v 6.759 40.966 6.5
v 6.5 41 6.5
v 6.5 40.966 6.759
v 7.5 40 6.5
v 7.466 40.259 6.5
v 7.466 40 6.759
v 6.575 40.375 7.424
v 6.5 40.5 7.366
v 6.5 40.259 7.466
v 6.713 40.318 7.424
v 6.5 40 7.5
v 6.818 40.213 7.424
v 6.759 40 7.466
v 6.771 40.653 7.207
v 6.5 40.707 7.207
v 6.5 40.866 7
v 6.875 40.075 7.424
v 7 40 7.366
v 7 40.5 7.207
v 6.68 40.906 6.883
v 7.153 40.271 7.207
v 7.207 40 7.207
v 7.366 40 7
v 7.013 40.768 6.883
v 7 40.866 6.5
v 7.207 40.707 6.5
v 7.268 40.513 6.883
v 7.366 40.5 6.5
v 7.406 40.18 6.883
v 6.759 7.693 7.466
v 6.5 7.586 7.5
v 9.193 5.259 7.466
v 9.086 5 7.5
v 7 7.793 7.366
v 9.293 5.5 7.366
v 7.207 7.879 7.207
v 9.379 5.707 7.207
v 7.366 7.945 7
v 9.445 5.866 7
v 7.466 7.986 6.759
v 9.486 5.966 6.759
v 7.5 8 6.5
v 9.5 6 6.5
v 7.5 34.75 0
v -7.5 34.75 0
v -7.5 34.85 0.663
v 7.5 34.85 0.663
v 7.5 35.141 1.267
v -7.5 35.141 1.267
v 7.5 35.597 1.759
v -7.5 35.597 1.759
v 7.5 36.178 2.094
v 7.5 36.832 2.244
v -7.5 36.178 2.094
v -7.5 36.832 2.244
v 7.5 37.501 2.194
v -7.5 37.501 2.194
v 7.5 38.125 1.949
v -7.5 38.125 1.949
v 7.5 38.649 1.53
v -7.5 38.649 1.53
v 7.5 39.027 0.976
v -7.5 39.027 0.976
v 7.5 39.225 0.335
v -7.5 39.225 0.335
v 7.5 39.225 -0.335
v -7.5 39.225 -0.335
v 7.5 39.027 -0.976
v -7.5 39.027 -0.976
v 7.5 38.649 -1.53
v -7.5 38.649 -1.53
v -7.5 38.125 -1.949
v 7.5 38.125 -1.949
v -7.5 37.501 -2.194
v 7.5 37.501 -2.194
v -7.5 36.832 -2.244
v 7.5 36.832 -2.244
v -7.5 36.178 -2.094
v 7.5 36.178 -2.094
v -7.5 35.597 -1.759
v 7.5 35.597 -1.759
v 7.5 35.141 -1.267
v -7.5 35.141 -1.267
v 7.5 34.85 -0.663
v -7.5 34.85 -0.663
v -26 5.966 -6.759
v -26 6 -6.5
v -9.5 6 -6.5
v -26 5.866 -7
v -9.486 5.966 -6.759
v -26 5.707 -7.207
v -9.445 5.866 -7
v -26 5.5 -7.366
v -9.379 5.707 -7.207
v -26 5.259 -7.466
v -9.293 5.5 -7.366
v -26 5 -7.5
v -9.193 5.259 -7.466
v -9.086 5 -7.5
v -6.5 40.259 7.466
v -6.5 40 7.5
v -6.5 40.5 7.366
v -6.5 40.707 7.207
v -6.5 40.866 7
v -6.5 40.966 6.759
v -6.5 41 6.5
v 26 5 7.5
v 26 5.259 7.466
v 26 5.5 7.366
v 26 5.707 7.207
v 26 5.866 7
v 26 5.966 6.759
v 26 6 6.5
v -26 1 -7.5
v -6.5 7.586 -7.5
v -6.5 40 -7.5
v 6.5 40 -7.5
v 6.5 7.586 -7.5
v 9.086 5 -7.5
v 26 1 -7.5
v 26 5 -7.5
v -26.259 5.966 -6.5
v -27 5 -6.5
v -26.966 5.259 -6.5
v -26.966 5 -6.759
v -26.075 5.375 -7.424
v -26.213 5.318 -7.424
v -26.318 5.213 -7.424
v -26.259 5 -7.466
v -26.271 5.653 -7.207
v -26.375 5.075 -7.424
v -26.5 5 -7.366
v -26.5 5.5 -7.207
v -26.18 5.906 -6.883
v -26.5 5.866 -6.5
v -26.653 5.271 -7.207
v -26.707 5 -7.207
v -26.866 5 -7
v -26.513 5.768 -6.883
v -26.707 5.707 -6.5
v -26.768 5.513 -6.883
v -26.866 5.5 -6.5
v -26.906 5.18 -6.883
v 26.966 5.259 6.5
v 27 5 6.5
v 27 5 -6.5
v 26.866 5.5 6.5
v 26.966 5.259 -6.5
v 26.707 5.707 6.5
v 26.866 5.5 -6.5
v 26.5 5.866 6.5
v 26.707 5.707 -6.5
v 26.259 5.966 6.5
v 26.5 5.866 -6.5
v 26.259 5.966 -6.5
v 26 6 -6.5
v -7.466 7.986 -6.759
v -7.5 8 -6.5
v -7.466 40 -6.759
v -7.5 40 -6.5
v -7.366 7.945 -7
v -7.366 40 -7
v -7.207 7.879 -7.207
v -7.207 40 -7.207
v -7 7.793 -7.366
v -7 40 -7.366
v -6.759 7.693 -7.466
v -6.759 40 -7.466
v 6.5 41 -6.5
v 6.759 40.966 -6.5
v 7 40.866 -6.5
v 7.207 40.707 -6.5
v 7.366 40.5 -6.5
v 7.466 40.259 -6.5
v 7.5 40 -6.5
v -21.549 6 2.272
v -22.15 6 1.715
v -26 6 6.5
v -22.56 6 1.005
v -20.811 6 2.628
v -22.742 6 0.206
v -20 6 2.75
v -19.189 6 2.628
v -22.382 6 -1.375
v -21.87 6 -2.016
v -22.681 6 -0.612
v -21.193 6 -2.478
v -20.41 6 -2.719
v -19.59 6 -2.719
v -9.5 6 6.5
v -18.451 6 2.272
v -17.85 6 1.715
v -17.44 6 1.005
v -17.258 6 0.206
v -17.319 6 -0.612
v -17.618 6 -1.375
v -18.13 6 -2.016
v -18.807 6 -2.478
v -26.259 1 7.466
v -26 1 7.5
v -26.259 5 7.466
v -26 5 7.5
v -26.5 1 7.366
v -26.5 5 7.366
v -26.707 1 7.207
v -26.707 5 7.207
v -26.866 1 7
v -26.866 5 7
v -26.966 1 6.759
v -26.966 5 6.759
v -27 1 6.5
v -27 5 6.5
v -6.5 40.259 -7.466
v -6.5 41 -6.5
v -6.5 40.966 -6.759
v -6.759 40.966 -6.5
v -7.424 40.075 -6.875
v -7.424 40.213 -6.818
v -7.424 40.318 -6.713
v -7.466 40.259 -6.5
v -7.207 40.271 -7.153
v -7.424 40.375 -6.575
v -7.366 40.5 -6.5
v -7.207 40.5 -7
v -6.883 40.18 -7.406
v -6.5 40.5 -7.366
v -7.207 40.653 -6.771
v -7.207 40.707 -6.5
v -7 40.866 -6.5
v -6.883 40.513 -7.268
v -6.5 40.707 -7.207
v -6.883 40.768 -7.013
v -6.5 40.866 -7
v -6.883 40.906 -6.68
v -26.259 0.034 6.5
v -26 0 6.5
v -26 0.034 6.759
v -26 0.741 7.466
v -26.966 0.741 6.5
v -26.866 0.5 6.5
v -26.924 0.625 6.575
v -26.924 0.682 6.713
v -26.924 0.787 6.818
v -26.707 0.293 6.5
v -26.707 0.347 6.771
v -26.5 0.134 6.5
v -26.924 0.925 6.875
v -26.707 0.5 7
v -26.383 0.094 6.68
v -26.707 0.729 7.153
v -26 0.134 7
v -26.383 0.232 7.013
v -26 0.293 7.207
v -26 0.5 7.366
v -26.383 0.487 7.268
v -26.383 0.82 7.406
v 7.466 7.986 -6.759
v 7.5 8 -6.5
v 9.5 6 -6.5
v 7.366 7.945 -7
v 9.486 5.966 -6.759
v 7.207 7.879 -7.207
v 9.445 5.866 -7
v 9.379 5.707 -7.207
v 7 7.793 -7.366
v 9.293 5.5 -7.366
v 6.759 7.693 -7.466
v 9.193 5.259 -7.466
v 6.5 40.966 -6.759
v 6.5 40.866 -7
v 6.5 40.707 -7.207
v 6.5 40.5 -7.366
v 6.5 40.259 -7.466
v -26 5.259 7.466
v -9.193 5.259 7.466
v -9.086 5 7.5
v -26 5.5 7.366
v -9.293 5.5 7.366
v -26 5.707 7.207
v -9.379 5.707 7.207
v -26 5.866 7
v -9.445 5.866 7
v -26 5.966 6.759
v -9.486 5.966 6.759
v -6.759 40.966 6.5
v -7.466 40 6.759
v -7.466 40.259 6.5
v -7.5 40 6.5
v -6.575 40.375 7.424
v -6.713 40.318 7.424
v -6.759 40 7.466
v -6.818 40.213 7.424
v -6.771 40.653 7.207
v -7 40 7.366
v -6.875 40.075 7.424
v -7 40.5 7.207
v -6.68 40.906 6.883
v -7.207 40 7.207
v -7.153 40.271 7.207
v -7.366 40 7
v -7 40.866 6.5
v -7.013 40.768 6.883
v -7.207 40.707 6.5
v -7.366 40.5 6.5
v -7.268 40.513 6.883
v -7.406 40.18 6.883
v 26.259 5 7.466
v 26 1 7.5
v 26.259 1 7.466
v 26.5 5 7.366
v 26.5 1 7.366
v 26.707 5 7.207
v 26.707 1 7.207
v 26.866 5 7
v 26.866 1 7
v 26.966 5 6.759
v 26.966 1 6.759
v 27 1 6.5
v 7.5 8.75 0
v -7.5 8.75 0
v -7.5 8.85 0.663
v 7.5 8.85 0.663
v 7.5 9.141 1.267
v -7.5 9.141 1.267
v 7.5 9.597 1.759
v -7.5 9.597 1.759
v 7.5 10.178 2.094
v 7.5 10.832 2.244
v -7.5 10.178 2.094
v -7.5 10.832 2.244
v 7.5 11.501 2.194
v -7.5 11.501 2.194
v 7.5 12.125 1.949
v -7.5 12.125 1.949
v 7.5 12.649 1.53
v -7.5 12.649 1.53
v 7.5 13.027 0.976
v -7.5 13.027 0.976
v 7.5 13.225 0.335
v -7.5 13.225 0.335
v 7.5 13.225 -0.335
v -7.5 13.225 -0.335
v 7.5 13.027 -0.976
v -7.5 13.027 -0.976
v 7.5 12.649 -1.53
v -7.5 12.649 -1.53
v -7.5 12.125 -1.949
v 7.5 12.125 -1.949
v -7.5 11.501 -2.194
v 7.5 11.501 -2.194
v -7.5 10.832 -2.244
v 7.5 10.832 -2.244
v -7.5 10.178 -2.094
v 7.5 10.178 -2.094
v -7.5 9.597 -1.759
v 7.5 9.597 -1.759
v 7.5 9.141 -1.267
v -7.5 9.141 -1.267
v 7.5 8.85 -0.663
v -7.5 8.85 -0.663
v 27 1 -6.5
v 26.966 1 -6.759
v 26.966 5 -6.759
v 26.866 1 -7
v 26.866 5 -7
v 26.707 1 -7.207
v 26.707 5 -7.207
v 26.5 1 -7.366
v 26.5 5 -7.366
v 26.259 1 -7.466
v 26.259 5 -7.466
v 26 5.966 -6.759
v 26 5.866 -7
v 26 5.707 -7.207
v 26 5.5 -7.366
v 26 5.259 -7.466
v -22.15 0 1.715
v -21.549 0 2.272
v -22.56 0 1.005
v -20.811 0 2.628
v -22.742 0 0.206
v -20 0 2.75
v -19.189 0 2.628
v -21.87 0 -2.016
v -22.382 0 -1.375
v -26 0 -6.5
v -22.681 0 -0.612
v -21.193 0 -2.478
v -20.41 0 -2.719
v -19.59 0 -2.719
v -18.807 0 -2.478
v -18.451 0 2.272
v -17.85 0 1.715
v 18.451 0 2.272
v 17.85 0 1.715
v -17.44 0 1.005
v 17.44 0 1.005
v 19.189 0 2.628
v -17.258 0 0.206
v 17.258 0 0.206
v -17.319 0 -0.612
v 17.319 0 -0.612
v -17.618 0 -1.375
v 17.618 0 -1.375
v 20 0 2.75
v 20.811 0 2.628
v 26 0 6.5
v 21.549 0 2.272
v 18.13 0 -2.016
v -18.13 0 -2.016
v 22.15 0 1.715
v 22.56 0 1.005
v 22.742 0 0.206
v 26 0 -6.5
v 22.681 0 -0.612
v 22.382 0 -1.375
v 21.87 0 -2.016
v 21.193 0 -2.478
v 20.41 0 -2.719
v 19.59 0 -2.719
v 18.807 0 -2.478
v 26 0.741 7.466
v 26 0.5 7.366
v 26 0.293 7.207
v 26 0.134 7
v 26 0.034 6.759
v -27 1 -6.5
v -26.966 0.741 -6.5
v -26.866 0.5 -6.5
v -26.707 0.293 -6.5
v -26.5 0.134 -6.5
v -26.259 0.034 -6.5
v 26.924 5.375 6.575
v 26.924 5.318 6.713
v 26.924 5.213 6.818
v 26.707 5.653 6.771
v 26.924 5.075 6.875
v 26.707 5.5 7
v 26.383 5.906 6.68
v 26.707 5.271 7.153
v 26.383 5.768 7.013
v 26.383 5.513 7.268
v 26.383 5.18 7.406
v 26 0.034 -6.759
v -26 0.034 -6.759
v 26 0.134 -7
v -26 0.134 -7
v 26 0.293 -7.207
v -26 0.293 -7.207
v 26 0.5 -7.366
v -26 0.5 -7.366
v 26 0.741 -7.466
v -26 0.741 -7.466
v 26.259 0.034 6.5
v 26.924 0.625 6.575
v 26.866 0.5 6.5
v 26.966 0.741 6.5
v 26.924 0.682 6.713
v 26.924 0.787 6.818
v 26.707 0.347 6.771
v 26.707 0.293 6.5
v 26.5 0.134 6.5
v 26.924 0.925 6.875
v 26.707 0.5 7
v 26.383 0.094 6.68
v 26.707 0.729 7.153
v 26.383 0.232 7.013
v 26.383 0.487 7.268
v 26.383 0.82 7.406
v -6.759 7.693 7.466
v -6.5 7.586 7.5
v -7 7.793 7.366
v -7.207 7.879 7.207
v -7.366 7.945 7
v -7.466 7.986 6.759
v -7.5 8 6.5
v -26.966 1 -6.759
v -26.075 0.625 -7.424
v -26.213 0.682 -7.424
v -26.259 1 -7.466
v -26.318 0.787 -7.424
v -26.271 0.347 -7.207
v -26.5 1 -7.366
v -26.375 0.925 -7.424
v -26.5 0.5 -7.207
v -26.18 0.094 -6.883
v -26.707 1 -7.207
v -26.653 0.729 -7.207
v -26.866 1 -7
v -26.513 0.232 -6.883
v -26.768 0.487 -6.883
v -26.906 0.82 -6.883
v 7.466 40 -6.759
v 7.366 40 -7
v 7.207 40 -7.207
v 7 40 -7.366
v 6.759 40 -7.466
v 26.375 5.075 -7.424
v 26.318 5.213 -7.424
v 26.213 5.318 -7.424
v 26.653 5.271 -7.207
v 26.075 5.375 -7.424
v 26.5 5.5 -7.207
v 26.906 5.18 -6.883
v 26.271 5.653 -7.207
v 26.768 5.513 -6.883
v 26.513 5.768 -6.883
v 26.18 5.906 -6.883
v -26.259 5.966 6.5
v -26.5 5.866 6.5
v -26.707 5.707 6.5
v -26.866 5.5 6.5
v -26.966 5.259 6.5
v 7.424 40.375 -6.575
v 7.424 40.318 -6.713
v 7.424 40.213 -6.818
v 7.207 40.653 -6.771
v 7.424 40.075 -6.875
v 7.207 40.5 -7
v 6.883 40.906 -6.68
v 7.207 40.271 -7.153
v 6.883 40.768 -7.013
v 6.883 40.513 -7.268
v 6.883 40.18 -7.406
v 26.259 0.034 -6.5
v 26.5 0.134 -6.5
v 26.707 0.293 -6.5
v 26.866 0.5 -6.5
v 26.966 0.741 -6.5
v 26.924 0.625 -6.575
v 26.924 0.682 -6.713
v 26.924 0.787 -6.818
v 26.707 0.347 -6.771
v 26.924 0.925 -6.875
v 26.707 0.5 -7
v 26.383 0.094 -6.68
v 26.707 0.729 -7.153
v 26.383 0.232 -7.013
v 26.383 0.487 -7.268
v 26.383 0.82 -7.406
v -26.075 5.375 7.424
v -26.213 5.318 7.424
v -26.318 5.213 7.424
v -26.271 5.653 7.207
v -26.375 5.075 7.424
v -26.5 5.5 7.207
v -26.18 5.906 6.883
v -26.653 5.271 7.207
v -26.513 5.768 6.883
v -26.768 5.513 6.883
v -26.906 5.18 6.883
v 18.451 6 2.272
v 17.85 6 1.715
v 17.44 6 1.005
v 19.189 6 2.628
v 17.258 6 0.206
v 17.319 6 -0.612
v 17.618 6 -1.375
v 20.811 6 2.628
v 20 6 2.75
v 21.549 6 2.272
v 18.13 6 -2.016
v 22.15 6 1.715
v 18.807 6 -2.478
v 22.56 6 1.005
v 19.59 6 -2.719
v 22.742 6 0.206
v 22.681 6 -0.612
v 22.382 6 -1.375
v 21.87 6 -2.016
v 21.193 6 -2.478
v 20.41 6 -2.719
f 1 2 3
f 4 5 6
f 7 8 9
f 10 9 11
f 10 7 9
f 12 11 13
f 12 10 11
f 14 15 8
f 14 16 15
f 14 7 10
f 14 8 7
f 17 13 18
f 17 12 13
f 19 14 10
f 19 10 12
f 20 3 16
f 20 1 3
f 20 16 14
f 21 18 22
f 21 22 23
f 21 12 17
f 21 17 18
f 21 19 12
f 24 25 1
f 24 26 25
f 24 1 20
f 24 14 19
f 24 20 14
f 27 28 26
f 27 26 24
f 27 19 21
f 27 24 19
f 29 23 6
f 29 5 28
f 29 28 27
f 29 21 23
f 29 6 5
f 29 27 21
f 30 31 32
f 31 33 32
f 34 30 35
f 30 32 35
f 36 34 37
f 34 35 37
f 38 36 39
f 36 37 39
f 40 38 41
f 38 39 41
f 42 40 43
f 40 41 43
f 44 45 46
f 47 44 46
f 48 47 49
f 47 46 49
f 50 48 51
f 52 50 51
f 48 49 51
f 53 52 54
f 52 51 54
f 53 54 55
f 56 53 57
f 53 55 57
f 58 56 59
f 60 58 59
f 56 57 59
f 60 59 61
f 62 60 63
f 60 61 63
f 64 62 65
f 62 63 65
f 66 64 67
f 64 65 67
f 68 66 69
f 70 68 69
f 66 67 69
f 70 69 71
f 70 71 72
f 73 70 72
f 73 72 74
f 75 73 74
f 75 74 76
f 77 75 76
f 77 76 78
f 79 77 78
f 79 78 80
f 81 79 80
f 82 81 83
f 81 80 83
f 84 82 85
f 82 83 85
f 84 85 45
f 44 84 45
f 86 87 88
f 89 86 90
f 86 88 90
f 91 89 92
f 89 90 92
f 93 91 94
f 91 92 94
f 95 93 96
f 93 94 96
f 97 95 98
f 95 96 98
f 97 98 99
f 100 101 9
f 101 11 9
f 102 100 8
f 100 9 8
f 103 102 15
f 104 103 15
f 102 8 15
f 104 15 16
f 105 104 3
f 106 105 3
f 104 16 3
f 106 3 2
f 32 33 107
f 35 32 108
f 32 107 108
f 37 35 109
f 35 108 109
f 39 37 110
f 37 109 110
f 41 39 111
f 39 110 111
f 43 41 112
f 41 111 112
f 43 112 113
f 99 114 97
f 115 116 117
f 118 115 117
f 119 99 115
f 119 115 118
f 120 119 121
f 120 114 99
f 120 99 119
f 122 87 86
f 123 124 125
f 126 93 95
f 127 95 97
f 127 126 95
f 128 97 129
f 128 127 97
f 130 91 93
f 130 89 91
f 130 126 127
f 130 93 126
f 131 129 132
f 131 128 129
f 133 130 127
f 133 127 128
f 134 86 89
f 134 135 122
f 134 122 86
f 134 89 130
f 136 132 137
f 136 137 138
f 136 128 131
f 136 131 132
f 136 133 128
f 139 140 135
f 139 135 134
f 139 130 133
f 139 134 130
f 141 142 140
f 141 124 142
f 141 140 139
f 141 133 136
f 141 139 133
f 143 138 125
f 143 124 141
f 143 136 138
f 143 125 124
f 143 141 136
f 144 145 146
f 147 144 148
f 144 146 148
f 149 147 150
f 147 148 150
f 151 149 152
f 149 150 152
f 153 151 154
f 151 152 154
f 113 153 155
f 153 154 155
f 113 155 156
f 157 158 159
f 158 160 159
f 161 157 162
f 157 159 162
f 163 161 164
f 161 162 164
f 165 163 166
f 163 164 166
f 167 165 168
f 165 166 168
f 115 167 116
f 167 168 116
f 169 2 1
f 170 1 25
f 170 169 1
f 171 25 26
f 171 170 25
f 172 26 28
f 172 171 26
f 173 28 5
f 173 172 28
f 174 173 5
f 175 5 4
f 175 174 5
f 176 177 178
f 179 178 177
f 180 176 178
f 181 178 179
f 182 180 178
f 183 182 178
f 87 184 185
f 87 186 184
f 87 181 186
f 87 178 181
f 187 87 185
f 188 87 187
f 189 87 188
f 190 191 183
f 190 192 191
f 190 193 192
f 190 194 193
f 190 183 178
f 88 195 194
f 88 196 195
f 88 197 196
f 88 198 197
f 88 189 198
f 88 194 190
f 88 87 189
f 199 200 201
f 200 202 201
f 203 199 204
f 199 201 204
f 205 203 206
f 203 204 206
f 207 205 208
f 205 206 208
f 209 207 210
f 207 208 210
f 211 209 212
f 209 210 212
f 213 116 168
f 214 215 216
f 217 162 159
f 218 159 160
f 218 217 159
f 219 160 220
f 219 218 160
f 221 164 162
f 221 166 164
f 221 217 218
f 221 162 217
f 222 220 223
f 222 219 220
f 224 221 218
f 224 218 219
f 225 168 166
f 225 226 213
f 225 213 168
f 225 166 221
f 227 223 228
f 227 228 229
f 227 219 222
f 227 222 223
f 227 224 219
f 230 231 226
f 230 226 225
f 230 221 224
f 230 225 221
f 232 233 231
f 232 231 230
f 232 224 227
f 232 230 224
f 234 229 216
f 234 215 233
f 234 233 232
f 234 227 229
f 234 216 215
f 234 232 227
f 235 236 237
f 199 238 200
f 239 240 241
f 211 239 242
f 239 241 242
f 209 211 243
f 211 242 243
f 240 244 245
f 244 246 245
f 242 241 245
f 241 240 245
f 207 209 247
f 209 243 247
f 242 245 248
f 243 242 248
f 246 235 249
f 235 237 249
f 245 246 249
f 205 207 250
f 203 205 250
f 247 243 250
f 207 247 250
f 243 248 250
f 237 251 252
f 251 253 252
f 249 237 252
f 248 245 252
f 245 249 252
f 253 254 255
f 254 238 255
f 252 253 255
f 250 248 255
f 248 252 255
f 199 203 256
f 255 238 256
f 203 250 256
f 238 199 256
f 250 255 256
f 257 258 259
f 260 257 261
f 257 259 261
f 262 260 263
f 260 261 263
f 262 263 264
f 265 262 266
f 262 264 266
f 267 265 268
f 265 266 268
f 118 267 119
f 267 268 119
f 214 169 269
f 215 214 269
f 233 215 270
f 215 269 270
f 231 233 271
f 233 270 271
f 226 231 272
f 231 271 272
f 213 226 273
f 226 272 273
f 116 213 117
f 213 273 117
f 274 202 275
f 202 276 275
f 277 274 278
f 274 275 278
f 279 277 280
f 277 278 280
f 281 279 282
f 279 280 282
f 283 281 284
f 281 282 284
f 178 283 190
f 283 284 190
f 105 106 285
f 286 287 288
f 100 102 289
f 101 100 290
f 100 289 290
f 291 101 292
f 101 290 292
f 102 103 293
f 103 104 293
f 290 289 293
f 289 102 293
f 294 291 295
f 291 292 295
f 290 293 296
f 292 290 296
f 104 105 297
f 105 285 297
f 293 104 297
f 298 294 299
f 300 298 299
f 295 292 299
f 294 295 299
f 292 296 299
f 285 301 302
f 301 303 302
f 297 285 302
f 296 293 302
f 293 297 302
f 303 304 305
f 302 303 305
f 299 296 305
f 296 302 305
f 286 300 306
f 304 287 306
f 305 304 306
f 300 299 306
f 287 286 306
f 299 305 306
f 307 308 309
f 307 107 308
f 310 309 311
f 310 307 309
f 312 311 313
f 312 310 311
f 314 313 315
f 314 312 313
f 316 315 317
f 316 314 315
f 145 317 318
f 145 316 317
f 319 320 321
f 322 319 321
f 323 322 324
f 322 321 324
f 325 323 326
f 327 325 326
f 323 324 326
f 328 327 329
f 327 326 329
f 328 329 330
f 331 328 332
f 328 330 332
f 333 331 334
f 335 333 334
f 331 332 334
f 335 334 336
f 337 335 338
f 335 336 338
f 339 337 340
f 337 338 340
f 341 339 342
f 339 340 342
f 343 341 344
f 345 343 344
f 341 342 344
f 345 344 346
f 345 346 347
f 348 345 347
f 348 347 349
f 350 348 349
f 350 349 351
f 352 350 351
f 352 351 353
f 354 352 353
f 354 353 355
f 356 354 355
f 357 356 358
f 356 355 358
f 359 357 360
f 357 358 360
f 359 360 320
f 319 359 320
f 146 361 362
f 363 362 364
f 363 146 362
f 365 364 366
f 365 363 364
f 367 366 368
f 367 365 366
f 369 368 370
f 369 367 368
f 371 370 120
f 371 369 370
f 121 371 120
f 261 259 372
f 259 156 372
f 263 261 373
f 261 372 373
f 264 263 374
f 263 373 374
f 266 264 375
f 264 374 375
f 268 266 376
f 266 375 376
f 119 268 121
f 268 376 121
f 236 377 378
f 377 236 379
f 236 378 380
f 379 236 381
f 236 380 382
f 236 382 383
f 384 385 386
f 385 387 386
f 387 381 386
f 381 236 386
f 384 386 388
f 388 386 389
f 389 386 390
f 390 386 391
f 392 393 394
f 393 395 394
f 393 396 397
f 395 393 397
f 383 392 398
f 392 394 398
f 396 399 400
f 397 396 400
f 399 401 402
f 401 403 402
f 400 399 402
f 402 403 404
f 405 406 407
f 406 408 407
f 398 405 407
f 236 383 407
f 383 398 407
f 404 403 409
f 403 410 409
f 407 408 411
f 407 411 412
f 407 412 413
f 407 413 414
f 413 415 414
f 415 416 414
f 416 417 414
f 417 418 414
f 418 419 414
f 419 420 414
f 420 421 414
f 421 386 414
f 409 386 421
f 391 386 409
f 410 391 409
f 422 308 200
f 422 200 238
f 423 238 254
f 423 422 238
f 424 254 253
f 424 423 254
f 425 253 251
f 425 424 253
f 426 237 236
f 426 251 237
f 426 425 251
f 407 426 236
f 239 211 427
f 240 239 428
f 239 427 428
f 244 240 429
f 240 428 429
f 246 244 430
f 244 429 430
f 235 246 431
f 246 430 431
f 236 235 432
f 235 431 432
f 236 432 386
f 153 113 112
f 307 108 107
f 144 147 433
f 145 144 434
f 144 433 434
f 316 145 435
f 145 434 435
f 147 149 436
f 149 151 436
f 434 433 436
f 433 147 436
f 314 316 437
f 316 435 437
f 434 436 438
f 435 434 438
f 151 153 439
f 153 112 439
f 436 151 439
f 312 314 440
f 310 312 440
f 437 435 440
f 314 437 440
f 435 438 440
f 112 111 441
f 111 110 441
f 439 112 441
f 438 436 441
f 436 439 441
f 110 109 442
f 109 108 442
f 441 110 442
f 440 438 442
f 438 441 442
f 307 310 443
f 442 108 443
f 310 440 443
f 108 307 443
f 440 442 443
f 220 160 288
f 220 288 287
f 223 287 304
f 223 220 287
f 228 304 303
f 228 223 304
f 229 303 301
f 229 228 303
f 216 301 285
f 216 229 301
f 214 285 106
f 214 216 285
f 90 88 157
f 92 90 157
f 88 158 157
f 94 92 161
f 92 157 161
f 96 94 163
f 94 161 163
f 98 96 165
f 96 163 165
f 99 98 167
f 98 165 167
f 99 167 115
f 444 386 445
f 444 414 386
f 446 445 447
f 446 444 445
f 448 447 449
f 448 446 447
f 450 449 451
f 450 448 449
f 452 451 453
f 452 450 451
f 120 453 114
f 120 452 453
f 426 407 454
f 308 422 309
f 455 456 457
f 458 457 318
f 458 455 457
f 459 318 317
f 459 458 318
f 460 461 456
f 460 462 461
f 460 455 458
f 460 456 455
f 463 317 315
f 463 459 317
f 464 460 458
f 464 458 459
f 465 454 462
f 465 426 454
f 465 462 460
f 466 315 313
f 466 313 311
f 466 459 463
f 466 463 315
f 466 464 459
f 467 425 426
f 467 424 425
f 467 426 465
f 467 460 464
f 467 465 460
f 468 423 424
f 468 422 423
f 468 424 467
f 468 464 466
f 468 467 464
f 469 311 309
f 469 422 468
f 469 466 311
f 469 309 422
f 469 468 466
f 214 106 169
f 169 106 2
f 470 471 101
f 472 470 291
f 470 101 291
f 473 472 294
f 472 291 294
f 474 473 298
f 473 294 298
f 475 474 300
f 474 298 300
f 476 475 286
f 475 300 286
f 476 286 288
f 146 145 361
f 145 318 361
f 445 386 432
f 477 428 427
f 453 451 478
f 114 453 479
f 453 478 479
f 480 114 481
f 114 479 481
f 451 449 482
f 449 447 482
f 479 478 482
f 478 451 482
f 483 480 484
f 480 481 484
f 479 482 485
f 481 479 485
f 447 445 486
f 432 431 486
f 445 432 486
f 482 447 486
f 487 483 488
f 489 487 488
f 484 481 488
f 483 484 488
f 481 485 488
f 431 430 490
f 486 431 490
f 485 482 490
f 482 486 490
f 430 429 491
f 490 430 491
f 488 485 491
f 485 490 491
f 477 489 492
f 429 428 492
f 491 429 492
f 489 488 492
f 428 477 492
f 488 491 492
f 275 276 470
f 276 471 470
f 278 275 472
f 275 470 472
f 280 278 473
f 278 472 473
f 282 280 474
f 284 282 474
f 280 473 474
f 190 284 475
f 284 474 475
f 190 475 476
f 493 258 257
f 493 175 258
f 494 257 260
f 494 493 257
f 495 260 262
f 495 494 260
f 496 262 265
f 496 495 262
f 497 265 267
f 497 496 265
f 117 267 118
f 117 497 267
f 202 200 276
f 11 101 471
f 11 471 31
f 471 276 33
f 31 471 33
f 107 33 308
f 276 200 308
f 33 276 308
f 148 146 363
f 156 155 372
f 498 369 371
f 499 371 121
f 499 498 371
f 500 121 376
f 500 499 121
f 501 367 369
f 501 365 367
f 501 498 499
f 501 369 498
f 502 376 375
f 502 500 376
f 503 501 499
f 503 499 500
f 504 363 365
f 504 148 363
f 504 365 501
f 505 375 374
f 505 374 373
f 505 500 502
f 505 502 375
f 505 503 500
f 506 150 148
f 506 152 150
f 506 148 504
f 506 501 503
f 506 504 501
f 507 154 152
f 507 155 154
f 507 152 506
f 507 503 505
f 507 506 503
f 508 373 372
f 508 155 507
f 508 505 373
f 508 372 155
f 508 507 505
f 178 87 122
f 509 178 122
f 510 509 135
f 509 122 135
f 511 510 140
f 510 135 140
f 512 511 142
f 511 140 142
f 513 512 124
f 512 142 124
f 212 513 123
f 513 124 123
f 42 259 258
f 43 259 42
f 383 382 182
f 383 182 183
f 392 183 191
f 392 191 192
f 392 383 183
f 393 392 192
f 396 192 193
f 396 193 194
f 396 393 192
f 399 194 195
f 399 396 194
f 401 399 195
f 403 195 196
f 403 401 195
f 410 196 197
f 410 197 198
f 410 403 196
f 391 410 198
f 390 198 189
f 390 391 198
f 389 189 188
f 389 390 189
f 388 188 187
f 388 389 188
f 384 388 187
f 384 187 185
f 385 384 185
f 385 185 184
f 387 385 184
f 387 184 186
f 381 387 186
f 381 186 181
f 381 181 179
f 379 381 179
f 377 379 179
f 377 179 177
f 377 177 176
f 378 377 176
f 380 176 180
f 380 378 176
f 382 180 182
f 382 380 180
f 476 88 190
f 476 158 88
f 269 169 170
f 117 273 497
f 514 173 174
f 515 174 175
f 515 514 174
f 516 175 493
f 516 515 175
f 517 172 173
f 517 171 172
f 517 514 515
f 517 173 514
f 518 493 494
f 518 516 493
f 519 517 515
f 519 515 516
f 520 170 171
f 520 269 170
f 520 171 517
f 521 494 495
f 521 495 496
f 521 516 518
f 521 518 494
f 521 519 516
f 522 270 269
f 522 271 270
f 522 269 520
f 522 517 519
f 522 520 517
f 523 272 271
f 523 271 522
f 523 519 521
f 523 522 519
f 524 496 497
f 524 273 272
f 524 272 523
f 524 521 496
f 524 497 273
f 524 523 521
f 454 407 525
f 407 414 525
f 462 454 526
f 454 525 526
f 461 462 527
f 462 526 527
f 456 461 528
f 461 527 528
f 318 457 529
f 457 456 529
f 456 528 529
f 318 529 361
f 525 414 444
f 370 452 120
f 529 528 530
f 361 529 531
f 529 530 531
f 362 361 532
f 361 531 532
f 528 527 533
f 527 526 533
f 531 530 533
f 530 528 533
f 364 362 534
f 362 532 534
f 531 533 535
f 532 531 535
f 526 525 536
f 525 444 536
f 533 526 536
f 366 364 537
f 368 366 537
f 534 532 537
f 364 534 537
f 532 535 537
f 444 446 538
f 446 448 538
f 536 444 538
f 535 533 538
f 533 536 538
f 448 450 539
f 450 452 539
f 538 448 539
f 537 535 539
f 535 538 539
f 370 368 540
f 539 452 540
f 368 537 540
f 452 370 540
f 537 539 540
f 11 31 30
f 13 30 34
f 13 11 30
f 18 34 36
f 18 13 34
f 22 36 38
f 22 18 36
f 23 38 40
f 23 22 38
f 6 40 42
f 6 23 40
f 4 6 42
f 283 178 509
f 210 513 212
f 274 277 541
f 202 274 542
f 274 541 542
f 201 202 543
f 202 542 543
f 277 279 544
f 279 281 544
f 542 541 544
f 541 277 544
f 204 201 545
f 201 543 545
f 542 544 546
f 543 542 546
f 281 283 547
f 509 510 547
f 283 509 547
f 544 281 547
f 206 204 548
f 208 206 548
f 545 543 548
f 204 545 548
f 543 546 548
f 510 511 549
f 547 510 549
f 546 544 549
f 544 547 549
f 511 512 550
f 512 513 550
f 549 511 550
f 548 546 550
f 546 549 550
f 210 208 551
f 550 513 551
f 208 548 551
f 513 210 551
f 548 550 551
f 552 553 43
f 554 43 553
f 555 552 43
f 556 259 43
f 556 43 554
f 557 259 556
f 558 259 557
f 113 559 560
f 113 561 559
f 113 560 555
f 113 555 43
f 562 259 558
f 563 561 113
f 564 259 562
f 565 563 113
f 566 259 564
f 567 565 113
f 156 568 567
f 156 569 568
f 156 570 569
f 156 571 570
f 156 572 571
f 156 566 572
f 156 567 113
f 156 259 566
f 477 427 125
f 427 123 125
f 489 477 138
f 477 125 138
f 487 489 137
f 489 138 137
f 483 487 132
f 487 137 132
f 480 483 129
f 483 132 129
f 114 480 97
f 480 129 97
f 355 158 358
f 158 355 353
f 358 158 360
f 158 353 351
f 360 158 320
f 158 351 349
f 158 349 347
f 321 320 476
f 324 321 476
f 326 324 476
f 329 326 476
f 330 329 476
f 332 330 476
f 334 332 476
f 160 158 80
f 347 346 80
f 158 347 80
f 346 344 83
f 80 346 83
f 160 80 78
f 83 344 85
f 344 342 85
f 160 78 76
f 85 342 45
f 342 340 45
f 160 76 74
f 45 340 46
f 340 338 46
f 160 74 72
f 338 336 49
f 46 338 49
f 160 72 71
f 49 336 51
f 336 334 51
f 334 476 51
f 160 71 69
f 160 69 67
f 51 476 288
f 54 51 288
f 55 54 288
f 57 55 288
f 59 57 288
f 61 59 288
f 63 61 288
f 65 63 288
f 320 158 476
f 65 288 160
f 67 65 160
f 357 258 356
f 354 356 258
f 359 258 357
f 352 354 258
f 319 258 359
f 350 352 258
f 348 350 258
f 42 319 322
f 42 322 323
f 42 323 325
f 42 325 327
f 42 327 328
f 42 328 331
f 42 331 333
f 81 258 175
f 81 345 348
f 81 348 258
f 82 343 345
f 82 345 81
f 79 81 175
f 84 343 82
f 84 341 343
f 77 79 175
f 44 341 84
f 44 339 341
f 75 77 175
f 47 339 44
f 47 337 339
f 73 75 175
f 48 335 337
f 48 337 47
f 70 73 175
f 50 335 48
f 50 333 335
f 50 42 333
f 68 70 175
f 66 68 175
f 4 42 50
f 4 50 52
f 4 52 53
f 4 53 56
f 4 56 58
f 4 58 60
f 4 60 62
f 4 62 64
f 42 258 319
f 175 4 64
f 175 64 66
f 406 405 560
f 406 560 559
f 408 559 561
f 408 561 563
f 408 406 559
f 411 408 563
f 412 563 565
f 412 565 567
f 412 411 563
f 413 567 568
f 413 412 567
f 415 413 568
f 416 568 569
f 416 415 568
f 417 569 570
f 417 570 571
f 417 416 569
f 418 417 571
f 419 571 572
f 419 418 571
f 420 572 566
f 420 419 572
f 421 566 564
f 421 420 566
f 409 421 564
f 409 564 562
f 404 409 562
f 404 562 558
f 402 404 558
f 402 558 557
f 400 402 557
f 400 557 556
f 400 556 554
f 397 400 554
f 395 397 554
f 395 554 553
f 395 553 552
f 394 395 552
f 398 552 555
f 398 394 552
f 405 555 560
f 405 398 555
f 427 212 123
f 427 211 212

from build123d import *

# Parameters (mm, degrees)
SKETCH_1_W          = 54
SKETCH_1_H          = 15
SKETCH_1_R          = 2.75
EXTRUDE_1_DEPTH     = 6
SKETCH_2_W          = 15
SKETCH_2_H          = 35
EXTRUDE_2_DEPTH     = 7.5
SKETCH_3_R          = 2.25
CUT_EXTRUDE_1_DEPTH = 15
CHAMFER_1_SIZE      = 2
FILLET_1_R          = 1


with BuildPart() as part:
    # 草图1 → 凸台-拉伸1 (new body)
    with BuildSketch(Plane(origin=(0, 0, 0), x_dir=(1, 0, 0), z_dir=(0, 1, 0))):
        Rectangle(SKETCH_1_W, SKETCH_1_H)
        with Locations(Location((-20, 0, 0), (0, 0, 270))):
            Circle(SKETCH_1_R, mode=Mode.SUBTRACT)
        with Locations(Location((20, 0, 0), (0, 0, 270))):
            Circle(SKETCH_1_R, mode=Mode.SUBTRACT)
    extrude(amount=EXTRUDE_1_DEPTH)

    # 草图2 → 凸台-拉伸2 (add, symmetric)
    with BuildSketch(Plane.XY):
        with Locations((0, 23.5)):
            Rectangle(SKETCH_2_W, SKETCH_2_H)
    extrude(amount=EXTRUDE_2_DEPTH, both=True)

    # 草图3 → 切除-拉伸1 (cut)
    with BuildSketch(Plane.ZY.offset(7.5)):
        with Locations(Location((0, 11, 0), (0, 0, 270))):
            Circle(SKETCH_3_R)
        with Locations(Location((0, 37, 0), (0, 0, 270))):
            Circle(SKETCH_3_R)
    extrude(amount=-CUT_EXTRUDE_1_DEPTH, mode=Mode.SUBTRACT)

    # 倒角1
    chamfer_1_edges = [part.edges().sort_by_distance(p)[0] for p in [
        (7.5, 6, 0),
        (-7.5, 6, 0),
    ]]
    chamfer(chamfer_1_edges, length=CHAMFER_1_SIZE)

    # 圆角1
    fillet_1_edges = [part.edges().sort_by_distance(p)[0] for p in [
        (-27, 6, 0),
        (-18.25, 6, 7.5),
        (0, 41, -7.5),
        (7.5, 41, 0),
        (-7.5, 24.5, -7.5),
        (-7.5, 41, 0),
        (0, 41, 7.5),
        (-7.5, 24.5, 7.5),
        (7.5, 24.5, -7.5),
        (7.5, 24.5, 7.5),
        (18.25, 6, 7.5),
        (-18.25, 6, -7.5),
        (27, 6, 0),
        (0, 0, 7.5),
        (8.5, 7, -7.5),
        (8.5, 7, 7.5),
        (-8.5, 7, -7.5),
        (-8.5, 7, 7.5),
        (-27, 0, 0),
        (0, 0, -7.5),
        (27, 0, 0),
        (27, 3, 7.5),
        (-27, 3, 7.5),
        (-27, 3, -7.5),
        (27, 3, -7.5),
        (18.25, 6, -7.5),
    ]]
    fillet(fillet_1_edges, radius=FILLET_1_R)


solid = part.part
